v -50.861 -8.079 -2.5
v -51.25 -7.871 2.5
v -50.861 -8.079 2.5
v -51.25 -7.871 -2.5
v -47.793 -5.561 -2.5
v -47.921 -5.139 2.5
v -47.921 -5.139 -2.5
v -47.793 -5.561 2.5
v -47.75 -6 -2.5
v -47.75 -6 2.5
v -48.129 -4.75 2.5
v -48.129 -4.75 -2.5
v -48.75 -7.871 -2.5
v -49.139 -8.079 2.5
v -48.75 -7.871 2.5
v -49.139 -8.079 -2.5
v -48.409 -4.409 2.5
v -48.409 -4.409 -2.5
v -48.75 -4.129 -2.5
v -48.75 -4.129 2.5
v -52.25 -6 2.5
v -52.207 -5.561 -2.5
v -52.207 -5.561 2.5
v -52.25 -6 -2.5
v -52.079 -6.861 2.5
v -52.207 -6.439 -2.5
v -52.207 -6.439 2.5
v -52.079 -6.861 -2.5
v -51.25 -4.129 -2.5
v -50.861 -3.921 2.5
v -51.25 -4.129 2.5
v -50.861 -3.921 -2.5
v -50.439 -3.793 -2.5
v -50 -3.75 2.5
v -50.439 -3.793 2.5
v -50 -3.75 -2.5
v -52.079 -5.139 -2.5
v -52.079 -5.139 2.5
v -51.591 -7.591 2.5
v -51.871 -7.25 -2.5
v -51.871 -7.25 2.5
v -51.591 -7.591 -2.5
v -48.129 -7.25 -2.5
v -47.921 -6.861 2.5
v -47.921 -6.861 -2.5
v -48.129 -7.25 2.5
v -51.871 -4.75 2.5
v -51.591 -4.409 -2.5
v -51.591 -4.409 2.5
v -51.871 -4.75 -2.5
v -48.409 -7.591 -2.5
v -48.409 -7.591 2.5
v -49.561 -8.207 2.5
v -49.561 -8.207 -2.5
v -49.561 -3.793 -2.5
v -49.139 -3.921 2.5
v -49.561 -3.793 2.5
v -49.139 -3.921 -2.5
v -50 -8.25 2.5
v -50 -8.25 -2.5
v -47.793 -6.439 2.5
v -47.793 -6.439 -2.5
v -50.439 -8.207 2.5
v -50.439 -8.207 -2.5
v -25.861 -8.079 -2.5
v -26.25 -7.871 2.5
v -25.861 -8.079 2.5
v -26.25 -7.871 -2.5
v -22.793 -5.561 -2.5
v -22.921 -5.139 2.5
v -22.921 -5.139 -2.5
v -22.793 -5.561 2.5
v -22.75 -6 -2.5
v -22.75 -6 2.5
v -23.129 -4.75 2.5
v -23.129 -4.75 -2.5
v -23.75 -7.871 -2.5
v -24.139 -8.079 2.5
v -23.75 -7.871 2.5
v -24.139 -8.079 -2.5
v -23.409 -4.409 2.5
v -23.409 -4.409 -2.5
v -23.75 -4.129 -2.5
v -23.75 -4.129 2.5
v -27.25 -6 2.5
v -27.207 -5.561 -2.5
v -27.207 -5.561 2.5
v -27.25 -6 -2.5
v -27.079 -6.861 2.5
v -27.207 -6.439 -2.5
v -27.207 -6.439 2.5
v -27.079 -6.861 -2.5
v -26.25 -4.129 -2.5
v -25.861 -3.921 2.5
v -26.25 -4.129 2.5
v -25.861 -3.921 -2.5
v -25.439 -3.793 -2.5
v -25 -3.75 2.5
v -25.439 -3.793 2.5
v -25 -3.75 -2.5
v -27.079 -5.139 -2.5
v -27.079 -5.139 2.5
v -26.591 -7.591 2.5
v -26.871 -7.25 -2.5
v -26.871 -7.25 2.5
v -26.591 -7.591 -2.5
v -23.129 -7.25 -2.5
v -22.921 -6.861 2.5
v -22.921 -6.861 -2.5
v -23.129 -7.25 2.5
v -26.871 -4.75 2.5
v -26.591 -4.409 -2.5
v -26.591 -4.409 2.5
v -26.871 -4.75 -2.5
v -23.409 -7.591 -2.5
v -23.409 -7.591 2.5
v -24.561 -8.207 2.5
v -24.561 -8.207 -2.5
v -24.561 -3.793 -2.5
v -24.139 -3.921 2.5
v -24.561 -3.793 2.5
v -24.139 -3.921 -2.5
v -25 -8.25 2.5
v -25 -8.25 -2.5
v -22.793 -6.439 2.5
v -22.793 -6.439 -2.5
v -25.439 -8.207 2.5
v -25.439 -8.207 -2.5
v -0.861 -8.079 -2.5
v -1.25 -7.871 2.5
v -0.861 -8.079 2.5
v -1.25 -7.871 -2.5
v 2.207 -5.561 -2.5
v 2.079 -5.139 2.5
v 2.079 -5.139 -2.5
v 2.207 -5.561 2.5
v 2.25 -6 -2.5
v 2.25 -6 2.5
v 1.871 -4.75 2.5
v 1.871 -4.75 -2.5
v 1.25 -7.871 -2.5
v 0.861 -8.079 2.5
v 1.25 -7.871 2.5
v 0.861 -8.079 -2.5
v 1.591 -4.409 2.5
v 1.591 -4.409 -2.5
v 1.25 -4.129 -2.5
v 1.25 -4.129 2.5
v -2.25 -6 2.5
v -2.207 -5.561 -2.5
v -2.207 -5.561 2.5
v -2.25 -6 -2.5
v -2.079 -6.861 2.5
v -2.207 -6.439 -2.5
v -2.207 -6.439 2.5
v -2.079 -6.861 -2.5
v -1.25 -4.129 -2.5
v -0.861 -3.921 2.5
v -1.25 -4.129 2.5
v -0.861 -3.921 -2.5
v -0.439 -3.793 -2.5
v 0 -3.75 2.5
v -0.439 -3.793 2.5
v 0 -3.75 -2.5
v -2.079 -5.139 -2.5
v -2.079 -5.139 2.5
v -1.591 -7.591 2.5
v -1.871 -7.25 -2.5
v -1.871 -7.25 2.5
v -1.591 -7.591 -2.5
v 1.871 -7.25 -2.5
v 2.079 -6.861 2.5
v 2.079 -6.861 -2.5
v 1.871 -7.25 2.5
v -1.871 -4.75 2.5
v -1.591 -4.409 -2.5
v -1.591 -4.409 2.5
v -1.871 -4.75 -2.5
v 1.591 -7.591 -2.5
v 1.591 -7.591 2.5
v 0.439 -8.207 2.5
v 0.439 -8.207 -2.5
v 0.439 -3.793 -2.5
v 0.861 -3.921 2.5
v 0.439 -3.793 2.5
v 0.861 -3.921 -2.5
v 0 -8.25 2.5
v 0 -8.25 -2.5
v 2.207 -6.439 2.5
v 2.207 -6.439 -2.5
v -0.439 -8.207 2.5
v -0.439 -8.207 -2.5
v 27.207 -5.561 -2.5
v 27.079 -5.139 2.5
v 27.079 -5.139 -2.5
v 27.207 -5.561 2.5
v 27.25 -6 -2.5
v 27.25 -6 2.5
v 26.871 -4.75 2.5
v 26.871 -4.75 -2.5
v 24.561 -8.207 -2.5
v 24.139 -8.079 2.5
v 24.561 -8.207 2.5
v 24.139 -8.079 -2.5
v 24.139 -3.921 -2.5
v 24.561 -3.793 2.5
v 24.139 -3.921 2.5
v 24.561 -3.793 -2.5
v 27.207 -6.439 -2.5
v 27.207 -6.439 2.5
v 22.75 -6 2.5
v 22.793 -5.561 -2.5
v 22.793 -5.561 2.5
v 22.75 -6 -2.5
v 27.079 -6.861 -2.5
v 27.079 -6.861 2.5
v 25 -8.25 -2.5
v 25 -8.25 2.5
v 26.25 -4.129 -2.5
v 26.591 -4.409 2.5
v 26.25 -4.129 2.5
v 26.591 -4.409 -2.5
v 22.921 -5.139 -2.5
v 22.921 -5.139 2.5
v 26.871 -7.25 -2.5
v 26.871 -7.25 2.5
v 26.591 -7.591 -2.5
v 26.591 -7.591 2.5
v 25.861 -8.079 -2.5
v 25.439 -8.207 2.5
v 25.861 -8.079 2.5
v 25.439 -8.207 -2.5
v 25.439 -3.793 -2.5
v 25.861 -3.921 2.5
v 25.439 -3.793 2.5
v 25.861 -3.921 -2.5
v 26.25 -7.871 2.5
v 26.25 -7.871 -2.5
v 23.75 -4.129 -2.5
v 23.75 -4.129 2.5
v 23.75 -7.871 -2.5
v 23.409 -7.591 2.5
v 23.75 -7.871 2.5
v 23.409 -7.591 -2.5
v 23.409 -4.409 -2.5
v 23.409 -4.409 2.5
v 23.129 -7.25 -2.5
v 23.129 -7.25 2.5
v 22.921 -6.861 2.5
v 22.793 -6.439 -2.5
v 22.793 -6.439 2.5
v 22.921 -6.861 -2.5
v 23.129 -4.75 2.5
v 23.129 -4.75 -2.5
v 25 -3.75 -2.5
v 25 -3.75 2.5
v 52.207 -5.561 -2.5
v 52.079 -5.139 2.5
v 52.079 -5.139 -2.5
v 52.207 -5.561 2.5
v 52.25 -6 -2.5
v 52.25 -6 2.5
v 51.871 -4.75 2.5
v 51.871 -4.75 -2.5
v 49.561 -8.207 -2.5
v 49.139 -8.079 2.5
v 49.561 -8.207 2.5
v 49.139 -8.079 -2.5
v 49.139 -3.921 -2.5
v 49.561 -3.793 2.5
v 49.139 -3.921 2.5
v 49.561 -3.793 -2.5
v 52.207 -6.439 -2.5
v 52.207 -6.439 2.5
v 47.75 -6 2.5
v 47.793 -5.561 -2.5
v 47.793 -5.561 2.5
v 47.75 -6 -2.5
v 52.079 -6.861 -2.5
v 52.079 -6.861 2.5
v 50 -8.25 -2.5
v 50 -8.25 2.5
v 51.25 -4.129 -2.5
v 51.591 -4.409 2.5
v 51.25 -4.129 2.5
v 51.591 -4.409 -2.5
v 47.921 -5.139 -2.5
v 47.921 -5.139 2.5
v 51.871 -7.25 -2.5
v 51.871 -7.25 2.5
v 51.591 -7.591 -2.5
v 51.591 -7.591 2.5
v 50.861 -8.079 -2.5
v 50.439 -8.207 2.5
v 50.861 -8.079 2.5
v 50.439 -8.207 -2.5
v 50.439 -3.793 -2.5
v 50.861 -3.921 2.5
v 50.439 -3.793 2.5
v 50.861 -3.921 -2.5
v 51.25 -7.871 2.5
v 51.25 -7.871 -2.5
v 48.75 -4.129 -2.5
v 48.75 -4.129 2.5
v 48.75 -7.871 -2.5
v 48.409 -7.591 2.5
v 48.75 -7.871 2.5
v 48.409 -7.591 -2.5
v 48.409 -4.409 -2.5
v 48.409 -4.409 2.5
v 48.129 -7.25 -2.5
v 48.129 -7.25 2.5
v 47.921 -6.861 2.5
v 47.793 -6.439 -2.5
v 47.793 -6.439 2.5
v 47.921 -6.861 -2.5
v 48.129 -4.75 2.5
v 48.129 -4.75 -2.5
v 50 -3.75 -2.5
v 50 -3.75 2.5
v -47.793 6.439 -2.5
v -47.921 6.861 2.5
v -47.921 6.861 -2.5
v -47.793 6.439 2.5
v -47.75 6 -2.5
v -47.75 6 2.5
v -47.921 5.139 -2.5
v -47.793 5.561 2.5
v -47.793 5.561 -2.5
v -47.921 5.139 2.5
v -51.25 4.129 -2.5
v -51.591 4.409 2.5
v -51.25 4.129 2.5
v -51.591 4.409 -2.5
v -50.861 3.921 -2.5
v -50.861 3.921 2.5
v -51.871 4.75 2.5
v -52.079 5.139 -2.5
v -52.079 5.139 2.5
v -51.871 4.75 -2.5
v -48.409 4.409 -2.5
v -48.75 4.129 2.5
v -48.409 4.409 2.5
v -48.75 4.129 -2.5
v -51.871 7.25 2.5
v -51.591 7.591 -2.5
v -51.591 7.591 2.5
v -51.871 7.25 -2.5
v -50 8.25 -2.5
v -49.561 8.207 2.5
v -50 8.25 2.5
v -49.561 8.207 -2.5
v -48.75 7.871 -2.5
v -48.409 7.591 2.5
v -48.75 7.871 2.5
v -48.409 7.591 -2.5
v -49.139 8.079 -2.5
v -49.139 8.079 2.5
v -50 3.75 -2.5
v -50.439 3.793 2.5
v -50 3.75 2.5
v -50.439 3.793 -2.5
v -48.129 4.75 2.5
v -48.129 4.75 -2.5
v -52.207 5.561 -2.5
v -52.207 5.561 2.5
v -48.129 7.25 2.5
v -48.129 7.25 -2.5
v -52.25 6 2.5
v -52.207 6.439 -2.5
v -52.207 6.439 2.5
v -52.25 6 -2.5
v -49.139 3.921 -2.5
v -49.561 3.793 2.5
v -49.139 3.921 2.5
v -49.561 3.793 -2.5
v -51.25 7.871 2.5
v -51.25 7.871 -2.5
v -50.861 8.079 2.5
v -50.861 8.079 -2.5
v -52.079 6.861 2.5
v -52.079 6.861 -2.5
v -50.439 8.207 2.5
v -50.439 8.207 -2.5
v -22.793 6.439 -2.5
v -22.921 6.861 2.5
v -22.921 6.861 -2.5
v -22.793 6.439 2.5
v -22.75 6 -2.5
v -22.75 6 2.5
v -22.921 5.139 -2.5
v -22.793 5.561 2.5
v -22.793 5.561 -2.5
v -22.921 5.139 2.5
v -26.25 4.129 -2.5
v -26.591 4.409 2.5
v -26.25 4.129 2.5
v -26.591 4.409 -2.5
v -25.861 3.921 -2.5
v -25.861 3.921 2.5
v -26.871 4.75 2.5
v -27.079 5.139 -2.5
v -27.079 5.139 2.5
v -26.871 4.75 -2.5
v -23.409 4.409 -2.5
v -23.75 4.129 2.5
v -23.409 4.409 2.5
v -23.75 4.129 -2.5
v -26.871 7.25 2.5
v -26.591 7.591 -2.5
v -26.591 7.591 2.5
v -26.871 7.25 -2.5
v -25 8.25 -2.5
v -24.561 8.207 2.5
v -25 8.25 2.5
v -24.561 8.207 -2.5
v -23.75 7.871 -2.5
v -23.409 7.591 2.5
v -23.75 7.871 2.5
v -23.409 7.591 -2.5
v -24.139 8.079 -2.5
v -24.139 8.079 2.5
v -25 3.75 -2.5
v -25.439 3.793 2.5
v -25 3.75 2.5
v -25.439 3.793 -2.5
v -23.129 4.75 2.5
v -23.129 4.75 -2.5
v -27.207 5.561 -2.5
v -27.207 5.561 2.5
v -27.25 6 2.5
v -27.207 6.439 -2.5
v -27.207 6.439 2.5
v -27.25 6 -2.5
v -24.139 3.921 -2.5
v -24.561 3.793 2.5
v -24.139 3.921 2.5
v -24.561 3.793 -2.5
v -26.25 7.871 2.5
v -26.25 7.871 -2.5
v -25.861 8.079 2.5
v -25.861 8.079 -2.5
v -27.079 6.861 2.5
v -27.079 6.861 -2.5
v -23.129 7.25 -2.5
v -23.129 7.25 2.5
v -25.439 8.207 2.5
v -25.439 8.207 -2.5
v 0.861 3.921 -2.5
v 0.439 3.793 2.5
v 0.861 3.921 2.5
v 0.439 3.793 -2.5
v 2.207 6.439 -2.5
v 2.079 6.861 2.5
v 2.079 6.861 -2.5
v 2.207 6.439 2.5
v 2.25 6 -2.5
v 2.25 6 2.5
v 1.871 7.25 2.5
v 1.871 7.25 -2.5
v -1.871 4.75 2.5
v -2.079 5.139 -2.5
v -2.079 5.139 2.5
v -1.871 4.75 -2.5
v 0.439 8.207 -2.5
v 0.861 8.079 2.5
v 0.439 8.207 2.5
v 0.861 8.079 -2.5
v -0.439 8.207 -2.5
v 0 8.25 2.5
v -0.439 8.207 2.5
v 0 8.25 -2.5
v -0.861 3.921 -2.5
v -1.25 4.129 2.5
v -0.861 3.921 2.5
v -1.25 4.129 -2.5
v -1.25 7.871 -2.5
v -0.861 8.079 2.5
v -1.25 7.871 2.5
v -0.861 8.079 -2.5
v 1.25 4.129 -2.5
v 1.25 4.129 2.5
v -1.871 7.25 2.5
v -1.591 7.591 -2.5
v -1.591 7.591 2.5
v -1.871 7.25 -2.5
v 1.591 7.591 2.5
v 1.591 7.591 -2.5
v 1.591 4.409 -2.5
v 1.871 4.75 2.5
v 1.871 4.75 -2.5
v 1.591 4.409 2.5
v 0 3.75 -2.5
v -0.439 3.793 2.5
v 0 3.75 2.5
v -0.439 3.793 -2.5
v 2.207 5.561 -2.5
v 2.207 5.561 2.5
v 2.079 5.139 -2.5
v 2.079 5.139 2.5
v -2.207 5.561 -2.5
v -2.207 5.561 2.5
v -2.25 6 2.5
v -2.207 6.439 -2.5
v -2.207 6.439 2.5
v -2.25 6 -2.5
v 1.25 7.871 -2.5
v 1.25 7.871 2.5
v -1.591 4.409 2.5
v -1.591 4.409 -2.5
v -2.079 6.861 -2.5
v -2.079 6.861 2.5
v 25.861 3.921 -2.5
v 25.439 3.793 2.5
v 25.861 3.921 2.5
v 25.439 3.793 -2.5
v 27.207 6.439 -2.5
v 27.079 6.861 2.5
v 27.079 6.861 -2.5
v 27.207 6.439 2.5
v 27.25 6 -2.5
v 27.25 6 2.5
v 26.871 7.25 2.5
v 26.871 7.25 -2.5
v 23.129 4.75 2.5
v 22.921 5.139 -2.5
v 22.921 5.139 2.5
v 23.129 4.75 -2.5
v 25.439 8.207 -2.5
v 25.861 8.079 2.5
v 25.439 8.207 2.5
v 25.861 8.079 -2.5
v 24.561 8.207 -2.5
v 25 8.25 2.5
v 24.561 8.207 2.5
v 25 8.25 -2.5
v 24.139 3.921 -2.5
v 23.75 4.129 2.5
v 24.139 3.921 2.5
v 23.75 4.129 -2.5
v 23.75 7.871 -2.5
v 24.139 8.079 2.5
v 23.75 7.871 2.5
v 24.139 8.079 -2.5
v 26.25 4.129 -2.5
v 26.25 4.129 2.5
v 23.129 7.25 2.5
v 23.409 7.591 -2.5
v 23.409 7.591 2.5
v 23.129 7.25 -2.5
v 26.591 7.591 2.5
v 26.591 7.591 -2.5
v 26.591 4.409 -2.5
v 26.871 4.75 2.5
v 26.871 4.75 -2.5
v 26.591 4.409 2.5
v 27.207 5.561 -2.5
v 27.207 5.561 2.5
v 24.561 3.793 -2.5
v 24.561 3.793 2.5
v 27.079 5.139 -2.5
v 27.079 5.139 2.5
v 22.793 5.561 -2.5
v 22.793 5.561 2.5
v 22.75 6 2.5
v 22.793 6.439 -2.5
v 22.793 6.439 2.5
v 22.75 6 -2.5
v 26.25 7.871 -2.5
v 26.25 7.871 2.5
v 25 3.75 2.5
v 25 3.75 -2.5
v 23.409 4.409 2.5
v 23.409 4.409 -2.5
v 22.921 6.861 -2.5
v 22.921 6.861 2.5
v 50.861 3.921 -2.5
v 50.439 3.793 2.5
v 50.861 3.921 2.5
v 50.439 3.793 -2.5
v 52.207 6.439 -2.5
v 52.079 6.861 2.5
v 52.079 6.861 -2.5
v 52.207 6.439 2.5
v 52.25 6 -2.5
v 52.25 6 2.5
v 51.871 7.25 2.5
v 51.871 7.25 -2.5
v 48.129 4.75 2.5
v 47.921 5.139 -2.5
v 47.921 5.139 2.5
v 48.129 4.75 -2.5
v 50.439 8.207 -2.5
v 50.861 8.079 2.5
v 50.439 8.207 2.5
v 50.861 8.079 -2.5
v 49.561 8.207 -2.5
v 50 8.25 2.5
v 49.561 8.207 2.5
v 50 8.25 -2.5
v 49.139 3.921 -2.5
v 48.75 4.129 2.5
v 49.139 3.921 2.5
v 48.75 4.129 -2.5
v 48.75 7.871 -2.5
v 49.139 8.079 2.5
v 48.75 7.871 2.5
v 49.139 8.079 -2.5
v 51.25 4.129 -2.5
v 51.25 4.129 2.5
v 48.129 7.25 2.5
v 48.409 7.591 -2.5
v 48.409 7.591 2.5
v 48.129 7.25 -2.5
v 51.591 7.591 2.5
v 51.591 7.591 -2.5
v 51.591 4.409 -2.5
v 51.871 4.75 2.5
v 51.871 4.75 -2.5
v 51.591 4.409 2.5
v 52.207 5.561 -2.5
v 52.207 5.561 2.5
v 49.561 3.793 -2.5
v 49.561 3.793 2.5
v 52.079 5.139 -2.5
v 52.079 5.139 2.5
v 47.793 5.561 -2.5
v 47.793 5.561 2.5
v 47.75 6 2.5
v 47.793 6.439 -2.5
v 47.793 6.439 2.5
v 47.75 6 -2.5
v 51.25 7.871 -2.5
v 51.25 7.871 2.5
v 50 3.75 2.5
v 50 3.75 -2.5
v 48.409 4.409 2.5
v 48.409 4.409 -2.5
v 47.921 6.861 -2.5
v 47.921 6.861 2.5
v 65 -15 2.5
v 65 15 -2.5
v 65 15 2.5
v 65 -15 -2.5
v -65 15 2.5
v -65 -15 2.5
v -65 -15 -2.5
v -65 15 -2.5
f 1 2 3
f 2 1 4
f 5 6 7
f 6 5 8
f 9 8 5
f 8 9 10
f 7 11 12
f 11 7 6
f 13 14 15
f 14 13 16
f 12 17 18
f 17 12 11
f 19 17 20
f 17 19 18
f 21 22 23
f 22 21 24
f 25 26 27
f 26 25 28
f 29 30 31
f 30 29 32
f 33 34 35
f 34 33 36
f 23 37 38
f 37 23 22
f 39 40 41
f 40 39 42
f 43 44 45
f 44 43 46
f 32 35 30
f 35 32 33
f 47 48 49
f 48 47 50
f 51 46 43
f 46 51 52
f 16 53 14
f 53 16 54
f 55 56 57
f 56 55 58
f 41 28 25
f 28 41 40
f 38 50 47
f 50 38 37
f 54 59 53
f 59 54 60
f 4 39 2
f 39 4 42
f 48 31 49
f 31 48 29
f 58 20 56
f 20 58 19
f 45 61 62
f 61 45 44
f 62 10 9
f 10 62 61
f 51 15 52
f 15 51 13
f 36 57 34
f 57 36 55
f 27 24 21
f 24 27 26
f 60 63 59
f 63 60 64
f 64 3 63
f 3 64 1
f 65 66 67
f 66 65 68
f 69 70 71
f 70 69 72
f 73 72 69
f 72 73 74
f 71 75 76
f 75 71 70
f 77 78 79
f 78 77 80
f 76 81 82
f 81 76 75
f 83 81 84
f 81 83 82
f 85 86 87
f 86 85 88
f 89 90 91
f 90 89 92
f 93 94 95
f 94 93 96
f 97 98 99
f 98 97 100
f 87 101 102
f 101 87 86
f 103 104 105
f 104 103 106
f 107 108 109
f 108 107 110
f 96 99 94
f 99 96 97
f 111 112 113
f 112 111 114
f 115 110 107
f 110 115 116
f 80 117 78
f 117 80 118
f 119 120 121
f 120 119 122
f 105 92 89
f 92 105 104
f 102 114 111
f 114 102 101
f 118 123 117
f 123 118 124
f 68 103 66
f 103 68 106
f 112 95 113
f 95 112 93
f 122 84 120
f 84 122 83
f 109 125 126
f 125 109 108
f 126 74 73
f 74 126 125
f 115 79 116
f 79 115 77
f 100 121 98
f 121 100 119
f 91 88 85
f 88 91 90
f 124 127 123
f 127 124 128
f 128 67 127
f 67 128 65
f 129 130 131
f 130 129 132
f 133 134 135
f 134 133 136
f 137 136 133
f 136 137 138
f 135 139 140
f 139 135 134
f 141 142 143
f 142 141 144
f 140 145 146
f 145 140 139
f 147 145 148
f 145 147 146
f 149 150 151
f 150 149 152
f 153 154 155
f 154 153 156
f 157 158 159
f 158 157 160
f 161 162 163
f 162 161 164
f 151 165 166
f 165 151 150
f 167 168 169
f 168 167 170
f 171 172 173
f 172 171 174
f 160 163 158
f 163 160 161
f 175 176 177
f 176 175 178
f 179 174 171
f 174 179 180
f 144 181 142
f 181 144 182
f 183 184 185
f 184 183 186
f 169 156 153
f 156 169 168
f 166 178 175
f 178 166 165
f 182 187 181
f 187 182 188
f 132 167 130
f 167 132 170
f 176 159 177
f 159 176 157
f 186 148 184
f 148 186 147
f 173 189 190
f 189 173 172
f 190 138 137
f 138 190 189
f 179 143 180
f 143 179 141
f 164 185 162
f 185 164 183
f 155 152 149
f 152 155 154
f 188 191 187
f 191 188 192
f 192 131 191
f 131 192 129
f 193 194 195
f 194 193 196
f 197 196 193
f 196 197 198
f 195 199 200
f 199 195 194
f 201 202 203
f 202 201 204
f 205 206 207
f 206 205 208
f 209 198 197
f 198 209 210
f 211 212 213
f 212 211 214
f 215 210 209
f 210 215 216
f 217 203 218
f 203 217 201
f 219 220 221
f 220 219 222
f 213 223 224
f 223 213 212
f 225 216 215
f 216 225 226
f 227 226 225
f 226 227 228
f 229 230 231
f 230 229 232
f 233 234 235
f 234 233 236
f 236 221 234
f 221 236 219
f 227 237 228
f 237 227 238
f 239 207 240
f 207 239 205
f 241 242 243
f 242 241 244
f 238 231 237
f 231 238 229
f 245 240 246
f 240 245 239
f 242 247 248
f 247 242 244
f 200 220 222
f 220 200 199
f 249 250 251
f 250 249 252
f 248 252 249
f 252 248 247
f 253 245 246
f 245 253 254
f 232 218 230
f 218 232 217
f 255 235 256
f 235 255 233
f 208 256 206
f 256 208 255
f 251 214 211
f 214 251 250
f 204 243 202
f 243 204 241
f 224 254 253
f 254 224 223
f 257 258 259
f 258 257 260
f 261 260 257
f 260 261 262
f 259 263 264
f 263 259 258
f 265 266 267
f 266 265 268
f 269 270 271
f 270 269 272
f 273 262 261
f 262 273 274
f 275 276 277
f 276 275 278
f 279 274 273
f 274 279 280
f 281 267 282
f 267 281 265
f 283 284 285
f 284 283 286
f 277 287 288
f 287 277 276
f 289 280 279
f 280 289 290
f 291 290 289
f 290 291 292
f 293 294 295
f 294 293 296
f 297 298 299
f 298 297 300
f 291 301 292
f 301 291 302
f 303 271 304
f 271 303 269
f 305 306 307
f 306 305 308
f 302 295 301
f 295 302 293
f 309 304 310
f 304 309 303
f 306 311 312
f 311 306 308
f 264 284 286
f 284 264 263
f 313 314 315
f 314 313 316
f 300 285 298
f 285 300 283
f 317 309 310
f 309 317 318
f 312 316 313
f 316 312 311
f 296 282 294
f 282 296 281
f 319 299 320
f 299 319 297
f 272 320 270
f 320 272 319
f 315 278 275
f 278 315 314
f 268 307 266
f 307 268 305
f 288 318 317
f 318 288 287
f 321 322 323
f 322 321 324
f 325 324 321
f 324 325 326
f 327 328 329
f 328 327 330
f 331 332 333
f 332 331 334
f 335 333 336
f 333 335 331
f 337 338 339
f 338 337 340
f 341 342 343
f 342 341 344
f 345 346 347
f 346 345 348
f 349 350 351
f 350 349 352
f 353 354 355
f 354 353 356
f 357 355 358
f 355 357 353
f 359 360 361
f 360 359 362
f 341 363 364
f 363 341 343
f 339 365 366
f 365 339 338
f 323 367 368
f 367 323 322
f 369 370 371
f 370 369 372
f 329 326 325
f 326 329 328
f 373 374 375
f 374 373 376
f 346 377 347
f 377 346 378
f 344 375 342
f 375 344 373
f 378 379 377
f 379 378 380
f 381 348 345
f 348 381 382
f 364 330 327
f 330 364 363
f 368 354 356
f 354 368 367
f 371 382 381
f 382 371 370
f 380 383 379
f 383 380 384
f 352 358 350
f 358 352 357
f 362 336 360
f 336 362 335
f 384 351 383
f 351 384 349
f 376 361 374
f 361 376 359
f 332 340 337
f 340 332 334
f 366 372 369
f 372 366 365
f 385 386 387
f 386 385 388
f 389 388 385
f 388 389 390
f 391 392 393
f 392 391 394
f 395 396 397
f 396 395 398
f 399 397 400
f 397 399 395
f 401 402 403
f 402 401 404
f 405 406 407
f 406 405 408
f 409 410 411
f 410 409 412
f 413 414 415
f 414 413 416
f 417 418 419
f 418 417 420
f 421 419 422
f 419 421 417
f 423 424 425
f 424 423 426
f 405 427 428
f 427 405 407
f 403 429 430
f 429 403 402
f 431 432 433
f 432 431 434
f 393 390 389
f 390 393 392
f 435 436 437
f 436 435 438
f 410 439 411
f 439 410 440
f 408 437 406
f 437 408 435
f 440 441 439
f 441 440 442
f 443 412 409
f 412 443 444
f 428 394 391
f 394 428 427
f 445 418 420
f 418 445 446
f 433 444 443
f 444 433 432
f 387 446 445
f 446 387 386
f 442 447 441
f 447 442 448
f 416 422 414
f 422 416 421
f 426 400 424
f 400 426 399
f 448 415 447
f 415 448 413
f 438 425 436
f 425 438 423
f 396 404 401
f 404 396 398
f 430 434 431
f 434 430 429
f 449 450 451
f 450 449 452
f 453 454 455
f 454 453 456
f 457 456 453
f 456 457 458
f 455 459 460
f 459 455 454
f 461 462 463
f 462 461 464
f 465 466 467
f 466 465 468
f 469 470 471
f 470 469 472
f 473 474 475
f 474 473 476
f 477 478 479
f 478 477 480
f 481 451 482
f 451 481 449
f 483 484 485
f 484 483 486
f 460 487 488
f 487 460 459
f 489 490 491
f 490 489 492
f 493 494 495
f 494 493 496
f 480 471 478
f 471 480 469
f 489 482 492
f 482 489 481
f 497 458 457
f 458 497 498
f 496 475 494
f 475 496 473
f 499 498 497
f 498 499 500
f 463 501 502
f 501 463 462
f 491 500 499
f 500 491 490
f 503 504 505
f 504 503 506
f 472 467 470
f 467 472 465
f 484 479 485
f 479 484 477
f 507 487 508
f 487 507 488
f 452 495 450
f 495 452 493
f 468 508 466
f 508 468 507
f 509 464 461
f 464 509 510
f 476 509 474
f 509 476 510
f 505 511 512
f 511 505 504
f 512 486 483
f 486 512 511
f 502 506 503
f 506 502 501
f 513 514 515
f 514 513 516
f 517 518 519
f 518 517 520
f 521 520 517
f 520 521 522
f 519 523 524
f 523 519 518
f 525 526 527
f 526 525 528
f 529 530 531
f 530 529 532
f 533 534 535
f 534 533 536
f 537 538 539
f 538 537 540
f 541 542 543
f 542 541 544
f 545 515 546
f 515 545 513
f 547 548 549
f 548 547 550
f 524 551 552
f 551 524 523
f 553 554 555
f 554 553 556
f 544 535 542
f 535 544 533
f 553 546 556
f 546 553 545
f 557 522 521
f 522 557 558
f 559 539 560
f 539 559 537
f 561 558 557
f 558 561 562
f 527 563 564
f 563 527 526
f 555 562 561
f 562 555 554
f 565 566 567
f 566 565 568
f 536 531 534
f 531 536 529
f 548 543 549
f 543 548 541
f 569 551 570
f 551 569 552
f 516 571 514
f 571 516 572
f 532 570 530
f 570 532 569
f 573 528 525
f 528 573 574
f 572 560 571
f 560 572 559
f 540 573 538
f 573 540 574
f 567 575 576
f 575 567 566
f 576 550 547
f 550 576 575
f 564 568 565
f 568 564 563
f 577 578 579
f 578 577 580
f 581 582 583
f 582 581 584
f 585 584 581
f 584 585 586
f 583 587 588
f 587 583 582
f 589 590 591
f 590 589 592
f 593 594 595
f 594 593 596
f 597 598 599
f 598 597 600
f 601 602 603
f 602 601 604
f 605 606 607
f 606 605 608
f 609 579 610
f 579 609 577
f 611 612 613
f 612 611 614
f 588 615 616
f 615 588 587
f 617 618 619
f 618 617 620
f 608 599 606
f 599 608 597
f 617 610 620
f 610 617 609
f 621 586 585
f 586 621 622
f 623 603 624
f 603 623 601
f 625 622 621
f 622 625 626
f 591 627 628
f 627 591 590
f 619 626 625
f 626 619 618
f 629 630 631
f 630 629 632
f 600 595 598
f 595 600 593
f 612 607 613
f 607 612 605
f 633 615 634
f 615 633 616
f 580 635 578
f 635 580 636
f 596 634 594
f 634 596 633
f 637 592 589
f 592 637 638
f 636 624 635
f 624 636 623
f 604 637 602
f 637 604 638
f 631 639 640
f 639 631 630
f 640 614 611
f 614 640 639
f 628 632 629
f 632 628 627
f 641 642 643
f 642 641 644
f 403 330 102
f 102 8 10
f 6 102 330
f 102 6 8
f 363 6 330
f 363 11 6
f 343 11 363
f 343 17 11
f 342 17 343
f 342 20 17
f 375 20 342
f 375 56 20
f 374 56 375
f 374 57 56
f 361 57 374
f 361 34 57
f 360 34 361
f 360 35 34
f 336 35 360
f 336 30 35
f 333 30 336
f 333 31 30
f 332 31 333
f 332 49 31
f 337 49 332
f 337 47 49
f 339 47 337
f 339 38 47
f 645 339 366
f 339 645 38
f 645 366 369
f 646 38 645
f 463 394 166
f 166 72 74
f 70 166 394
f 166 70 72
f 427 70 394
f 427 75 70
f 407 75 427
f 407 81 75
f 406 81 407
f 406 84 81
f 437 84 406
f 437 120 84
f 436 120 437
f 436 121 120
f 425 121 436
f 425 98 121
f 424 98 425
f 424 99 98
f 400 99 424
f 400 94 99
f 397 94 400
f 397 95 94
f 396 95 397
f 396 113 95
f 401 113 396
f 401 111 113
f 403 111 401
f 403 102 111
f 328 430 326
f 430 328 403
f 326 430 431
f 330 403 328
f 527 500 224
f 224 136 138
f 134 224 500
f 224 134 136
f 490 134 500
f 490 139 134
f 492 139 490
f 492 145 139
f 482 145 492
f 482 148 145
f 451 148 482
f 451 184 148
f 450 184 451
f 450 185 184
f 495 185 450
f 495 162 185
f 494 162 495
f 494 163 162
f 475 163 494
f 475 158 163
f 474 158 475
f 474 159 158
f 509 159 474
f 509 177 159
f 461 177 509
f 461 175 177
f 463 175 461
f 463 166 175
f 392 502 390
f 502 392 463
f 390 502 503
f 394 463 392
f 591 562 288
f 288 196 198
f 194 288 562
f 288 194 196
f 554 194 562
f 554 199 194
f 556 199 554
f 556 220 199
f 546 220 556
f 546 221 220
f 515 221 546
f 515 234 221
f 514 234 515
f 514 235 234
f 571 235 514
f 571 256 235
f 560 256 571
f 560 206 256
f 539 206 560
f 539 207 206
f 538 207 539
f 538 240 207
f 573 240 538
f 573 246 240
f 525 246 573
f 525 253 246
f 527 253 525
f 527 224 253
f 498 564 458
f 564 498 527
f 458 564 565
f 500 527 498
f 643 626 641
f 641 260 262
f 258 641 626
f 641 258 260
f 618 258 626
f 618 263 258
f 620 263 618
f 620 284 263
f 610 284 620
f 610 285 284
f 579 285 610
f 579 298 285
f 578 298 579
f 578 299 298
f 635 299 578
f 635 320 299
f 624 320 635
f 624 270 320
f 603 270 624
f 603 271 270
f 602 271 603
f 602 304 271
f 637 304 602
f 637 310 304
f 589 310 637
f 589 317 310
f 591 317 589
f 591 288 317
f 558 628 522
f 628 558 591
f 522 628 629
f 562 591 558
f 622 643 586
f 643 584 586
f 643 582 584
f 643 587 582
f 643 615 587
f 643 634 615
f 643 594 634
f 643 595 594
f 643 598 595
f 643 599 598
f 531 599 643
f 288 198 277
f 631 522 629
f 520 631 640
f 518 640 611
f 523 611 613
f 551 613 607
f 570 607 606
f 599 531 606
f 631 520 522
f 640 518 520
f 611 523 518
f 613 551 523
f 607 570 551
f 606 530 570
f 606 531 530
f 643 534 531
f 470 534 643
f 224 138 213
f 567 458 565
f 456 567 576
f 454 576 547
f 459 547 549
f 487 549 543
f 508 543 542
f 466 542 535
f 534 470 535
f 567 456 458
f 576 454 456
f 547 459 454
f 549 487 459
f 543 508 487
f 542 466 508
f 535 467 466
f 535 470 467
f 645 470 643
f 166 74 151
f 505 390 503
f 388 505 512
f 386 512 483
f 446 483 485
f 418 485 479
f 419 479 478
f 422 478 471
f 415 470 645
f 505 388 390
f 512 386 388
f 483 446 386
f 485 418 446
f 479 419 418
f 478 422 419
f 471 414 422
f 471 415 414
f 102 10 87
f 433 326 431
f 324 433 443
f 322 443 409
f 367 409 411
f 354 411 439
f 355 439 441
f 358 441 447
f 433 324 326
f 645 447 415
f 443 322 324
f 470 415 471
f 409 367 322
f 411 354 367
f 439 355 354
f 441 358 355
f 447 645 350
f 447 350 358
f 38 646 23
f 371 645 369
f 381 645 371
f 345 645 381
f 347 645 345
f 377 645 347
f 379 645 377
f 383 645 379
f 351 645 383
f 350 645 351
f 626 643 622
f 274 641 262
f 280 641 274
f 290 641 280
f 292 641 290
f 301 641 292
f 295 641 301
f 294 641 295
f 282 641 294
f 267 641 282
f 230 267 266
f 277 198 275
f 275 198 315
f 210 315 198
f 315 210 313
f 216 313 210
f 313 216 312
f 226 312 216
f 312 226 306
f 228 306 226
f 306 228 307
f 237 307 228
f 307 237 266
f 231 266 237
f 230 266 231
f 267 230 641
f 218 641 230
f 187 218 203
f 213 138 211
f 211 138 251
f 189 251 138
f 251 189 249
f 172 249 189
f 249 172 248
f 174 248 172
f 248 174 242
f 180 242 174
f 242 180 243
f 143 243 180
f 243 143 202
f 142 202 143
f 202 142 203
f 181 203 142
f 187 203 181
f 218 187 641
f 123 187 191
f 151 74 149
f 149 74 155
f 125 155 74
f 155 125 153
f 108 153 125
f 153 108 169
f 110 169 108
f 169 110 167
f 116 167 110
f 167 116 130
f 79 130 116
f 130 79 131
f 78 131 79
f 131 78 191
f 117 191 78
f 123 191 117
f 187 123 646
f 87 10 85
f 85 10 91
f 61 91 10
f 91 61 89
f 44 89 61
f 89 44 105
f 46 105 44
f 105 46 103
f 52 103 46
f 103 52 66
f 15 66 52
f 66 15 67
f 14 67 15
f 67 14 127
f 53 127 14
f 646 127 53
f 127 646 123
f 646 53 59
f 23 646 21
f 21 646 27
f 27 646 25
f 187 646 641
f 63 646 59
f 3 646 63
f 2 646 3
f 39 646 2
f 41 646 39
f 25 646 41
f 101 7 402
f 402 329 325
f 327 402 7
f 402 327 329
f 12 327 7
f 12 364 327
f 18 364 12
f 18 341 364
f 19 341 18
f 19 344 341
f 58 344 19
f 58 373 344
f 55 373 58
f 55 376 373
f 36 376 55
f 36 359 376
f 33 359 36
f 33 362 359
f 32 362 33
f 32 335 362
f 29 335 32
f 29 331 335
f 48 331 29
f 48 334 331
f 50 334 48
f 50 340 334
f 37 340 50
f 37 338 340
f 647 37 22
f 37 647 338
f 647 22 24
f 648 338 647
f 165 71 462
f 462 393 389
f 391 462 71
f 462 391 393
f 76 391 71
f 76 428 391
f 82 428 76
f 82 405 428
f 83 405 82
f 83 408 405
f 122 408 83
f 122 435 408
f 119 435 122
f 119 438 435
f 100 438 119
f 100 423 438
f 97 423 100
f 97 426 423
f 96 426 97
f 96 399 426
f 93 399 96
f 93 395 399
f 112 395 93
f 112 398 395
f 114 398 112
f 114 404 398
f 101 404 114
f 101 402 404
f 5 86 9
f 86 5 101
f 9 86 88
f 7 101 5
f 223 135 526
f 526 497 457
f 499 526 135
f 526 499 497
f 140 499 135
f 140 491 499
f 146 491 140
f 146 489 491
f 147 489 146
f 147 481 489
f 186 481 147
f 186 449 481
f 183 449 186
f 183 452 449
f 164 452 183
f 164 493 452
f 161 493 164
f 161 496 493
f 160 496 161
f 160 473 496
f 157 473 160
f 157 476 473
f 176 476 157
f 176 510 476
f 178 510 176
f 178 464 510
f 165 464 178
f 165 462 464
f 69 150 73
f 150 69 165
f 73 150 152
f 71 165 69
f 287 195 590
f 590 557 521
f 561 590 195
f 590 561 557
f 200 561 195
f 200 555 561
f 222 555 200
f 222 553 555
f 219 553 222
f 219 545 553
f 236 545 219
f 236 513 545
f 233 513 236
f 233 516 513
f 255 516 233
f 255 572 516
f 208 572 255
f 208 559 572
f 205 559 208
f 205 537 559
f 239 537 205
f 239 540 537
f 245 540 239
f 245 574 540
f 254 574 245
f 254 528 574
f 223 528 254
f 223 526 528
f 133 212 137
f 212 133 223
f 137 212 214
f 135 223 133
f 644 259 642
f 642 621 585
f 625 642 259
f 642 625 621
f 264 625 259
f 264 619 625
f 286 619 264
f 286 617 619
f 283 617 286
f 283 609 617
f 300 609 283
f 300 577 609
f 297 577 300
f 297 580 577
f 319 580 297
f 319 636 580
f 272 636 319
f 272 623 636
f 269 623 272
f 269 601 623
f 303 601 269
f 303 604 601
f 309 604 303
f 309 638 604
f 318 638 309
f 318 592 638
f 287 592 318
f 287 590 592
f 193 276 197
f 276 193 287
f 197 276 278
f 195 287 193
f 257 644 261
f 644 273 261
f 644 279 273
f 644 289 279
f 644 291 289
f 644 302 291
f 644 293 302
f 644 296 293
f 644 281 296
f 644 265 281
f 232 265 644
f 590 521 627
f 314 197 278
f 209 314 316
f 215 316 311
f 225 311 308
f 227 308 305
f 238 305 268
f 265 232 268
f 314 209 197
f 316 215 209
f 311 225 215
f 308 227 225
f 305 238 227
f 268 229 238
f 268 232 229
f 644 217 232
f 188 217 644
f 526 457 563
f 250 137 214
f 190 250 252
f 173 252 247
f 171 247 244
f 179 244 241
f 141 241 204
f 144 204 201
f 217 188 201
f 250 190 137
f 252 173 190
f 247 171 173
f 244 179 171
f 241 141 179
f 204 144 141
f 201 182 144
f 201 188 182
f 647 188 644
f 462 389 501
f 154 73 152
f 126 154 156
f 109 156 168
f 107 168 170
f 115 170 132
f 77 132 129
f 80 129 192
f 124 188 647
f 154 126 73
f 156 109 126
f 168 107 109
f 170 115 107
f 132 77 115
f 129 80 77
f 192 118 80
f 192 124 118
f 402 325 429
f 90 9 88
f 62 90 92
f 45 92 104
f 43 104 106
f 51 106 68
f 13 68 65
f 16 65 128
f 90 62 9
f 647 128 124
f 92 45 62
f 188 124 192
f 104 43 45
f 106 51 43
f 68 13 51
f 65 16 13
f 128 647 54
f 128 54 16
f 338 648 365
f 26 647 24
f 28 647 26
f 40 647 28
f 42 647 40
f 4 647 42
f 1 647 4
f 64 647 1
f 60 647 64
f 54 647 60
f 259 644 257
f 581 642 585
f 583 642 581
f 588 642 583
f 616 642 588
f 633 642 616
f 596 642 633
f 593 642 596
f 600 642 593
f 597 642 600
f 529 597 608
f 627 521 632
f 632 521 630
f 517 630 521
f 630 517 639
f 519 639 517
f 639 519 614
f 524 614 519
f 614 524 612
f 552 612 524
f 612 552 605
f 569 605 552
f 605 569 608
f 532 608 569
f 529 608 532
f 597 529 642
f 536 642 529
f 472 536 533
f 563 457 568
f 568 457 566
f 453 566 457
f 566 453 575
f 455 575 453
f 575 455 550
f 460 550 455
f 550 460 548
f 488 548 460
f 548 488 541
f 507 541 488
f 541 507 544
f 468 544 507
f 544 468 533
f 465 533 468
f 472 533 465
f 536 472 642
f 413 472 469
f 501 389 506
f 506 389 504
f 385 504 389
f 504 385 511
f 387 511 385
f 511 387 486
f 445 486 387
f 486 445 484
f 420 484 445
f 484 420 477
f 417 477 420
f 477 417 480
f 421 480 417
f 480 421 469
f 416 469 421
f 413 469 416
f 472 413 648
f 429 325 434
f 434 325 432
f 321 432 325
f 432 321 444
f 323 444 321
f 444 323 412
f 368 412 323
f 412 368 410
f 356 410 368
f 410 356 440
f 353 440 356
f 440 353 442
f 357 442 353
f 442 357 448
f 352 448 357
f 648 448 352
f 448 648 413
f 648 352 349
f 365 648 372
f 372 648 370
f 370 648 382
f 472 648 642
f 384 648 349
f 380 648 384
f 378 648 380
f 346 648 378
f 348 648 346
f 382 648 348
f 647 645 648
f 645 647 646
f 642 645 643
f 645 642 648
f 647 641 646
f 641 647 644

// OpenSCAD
$fn = 32;

// ----------------------------------------------------------------------
// Hole bar, 5 x Ø4.5
// tworows layout, 15 mm edge offset
// ----------------------------------------------------------------------

// --- parameters (mm) ---
bar_w = 30;       // bar width (Y)
bar_t = 5;        // bar thickness (Z)
holes = 5;        // holes per row
hole_d = 4.5;     // hole diameter
edge = 15;        // offset from the bar end to the first hole
pitch = 25;       // pitch between neighbouring holes
row_offset = 12;  // distance between the two rows

// --- derived feature positions (mm) ---
span = (holes - 1) * pitch;   // = 100   distance between the end holes
bar_l = span + 2 * edge;      // = 130   overall bar length
start_x = -bar_l / 2 + edge;  // = -50   X of the first hole
feature_centers = [
  [start_x + 0 * pitch, -row_offset / 2],
  [start_x + 1 * pitch, -row_offset / 2],
  [start_x + 2 * pitch, -row_offset / 2],
  [start_x + 3 * pitch, -row_offset / 2],
  [start_x + 4 * pitch, -row_offset / 2]
];   // hole centres of the first row
row2_centers = [
  [start_x + 0 * pitch, row_offset / 2],
  [start_x + 1 * pitch, row_offset / 2],
  [start_x + 2 * pitch, row_offset / 2],
  [start_x + 3 * pitch, row_offset / 2],
  [start_x + 4 * pitch, row_offset / 2]
];   // hole centres of the second row

// bar with two rows of holes, both read from their own centre arrays
difference() {
  translate([-bar_l / 2, -bar_w / 2, -bar_t / 2]) cube([bar_l, bar_w, bar_t]);
  for (centre = feature_centers)
    translate([centre[0], centre[1], 0])
      cylinder(d = hole_d, h = bar_t + 2, center = true);
  for (centre = row2_centers)
    translate([centre[0], centre[1], 0])
      cylinder(d = hole_d, h = bar_t + 2, center = true);
}
